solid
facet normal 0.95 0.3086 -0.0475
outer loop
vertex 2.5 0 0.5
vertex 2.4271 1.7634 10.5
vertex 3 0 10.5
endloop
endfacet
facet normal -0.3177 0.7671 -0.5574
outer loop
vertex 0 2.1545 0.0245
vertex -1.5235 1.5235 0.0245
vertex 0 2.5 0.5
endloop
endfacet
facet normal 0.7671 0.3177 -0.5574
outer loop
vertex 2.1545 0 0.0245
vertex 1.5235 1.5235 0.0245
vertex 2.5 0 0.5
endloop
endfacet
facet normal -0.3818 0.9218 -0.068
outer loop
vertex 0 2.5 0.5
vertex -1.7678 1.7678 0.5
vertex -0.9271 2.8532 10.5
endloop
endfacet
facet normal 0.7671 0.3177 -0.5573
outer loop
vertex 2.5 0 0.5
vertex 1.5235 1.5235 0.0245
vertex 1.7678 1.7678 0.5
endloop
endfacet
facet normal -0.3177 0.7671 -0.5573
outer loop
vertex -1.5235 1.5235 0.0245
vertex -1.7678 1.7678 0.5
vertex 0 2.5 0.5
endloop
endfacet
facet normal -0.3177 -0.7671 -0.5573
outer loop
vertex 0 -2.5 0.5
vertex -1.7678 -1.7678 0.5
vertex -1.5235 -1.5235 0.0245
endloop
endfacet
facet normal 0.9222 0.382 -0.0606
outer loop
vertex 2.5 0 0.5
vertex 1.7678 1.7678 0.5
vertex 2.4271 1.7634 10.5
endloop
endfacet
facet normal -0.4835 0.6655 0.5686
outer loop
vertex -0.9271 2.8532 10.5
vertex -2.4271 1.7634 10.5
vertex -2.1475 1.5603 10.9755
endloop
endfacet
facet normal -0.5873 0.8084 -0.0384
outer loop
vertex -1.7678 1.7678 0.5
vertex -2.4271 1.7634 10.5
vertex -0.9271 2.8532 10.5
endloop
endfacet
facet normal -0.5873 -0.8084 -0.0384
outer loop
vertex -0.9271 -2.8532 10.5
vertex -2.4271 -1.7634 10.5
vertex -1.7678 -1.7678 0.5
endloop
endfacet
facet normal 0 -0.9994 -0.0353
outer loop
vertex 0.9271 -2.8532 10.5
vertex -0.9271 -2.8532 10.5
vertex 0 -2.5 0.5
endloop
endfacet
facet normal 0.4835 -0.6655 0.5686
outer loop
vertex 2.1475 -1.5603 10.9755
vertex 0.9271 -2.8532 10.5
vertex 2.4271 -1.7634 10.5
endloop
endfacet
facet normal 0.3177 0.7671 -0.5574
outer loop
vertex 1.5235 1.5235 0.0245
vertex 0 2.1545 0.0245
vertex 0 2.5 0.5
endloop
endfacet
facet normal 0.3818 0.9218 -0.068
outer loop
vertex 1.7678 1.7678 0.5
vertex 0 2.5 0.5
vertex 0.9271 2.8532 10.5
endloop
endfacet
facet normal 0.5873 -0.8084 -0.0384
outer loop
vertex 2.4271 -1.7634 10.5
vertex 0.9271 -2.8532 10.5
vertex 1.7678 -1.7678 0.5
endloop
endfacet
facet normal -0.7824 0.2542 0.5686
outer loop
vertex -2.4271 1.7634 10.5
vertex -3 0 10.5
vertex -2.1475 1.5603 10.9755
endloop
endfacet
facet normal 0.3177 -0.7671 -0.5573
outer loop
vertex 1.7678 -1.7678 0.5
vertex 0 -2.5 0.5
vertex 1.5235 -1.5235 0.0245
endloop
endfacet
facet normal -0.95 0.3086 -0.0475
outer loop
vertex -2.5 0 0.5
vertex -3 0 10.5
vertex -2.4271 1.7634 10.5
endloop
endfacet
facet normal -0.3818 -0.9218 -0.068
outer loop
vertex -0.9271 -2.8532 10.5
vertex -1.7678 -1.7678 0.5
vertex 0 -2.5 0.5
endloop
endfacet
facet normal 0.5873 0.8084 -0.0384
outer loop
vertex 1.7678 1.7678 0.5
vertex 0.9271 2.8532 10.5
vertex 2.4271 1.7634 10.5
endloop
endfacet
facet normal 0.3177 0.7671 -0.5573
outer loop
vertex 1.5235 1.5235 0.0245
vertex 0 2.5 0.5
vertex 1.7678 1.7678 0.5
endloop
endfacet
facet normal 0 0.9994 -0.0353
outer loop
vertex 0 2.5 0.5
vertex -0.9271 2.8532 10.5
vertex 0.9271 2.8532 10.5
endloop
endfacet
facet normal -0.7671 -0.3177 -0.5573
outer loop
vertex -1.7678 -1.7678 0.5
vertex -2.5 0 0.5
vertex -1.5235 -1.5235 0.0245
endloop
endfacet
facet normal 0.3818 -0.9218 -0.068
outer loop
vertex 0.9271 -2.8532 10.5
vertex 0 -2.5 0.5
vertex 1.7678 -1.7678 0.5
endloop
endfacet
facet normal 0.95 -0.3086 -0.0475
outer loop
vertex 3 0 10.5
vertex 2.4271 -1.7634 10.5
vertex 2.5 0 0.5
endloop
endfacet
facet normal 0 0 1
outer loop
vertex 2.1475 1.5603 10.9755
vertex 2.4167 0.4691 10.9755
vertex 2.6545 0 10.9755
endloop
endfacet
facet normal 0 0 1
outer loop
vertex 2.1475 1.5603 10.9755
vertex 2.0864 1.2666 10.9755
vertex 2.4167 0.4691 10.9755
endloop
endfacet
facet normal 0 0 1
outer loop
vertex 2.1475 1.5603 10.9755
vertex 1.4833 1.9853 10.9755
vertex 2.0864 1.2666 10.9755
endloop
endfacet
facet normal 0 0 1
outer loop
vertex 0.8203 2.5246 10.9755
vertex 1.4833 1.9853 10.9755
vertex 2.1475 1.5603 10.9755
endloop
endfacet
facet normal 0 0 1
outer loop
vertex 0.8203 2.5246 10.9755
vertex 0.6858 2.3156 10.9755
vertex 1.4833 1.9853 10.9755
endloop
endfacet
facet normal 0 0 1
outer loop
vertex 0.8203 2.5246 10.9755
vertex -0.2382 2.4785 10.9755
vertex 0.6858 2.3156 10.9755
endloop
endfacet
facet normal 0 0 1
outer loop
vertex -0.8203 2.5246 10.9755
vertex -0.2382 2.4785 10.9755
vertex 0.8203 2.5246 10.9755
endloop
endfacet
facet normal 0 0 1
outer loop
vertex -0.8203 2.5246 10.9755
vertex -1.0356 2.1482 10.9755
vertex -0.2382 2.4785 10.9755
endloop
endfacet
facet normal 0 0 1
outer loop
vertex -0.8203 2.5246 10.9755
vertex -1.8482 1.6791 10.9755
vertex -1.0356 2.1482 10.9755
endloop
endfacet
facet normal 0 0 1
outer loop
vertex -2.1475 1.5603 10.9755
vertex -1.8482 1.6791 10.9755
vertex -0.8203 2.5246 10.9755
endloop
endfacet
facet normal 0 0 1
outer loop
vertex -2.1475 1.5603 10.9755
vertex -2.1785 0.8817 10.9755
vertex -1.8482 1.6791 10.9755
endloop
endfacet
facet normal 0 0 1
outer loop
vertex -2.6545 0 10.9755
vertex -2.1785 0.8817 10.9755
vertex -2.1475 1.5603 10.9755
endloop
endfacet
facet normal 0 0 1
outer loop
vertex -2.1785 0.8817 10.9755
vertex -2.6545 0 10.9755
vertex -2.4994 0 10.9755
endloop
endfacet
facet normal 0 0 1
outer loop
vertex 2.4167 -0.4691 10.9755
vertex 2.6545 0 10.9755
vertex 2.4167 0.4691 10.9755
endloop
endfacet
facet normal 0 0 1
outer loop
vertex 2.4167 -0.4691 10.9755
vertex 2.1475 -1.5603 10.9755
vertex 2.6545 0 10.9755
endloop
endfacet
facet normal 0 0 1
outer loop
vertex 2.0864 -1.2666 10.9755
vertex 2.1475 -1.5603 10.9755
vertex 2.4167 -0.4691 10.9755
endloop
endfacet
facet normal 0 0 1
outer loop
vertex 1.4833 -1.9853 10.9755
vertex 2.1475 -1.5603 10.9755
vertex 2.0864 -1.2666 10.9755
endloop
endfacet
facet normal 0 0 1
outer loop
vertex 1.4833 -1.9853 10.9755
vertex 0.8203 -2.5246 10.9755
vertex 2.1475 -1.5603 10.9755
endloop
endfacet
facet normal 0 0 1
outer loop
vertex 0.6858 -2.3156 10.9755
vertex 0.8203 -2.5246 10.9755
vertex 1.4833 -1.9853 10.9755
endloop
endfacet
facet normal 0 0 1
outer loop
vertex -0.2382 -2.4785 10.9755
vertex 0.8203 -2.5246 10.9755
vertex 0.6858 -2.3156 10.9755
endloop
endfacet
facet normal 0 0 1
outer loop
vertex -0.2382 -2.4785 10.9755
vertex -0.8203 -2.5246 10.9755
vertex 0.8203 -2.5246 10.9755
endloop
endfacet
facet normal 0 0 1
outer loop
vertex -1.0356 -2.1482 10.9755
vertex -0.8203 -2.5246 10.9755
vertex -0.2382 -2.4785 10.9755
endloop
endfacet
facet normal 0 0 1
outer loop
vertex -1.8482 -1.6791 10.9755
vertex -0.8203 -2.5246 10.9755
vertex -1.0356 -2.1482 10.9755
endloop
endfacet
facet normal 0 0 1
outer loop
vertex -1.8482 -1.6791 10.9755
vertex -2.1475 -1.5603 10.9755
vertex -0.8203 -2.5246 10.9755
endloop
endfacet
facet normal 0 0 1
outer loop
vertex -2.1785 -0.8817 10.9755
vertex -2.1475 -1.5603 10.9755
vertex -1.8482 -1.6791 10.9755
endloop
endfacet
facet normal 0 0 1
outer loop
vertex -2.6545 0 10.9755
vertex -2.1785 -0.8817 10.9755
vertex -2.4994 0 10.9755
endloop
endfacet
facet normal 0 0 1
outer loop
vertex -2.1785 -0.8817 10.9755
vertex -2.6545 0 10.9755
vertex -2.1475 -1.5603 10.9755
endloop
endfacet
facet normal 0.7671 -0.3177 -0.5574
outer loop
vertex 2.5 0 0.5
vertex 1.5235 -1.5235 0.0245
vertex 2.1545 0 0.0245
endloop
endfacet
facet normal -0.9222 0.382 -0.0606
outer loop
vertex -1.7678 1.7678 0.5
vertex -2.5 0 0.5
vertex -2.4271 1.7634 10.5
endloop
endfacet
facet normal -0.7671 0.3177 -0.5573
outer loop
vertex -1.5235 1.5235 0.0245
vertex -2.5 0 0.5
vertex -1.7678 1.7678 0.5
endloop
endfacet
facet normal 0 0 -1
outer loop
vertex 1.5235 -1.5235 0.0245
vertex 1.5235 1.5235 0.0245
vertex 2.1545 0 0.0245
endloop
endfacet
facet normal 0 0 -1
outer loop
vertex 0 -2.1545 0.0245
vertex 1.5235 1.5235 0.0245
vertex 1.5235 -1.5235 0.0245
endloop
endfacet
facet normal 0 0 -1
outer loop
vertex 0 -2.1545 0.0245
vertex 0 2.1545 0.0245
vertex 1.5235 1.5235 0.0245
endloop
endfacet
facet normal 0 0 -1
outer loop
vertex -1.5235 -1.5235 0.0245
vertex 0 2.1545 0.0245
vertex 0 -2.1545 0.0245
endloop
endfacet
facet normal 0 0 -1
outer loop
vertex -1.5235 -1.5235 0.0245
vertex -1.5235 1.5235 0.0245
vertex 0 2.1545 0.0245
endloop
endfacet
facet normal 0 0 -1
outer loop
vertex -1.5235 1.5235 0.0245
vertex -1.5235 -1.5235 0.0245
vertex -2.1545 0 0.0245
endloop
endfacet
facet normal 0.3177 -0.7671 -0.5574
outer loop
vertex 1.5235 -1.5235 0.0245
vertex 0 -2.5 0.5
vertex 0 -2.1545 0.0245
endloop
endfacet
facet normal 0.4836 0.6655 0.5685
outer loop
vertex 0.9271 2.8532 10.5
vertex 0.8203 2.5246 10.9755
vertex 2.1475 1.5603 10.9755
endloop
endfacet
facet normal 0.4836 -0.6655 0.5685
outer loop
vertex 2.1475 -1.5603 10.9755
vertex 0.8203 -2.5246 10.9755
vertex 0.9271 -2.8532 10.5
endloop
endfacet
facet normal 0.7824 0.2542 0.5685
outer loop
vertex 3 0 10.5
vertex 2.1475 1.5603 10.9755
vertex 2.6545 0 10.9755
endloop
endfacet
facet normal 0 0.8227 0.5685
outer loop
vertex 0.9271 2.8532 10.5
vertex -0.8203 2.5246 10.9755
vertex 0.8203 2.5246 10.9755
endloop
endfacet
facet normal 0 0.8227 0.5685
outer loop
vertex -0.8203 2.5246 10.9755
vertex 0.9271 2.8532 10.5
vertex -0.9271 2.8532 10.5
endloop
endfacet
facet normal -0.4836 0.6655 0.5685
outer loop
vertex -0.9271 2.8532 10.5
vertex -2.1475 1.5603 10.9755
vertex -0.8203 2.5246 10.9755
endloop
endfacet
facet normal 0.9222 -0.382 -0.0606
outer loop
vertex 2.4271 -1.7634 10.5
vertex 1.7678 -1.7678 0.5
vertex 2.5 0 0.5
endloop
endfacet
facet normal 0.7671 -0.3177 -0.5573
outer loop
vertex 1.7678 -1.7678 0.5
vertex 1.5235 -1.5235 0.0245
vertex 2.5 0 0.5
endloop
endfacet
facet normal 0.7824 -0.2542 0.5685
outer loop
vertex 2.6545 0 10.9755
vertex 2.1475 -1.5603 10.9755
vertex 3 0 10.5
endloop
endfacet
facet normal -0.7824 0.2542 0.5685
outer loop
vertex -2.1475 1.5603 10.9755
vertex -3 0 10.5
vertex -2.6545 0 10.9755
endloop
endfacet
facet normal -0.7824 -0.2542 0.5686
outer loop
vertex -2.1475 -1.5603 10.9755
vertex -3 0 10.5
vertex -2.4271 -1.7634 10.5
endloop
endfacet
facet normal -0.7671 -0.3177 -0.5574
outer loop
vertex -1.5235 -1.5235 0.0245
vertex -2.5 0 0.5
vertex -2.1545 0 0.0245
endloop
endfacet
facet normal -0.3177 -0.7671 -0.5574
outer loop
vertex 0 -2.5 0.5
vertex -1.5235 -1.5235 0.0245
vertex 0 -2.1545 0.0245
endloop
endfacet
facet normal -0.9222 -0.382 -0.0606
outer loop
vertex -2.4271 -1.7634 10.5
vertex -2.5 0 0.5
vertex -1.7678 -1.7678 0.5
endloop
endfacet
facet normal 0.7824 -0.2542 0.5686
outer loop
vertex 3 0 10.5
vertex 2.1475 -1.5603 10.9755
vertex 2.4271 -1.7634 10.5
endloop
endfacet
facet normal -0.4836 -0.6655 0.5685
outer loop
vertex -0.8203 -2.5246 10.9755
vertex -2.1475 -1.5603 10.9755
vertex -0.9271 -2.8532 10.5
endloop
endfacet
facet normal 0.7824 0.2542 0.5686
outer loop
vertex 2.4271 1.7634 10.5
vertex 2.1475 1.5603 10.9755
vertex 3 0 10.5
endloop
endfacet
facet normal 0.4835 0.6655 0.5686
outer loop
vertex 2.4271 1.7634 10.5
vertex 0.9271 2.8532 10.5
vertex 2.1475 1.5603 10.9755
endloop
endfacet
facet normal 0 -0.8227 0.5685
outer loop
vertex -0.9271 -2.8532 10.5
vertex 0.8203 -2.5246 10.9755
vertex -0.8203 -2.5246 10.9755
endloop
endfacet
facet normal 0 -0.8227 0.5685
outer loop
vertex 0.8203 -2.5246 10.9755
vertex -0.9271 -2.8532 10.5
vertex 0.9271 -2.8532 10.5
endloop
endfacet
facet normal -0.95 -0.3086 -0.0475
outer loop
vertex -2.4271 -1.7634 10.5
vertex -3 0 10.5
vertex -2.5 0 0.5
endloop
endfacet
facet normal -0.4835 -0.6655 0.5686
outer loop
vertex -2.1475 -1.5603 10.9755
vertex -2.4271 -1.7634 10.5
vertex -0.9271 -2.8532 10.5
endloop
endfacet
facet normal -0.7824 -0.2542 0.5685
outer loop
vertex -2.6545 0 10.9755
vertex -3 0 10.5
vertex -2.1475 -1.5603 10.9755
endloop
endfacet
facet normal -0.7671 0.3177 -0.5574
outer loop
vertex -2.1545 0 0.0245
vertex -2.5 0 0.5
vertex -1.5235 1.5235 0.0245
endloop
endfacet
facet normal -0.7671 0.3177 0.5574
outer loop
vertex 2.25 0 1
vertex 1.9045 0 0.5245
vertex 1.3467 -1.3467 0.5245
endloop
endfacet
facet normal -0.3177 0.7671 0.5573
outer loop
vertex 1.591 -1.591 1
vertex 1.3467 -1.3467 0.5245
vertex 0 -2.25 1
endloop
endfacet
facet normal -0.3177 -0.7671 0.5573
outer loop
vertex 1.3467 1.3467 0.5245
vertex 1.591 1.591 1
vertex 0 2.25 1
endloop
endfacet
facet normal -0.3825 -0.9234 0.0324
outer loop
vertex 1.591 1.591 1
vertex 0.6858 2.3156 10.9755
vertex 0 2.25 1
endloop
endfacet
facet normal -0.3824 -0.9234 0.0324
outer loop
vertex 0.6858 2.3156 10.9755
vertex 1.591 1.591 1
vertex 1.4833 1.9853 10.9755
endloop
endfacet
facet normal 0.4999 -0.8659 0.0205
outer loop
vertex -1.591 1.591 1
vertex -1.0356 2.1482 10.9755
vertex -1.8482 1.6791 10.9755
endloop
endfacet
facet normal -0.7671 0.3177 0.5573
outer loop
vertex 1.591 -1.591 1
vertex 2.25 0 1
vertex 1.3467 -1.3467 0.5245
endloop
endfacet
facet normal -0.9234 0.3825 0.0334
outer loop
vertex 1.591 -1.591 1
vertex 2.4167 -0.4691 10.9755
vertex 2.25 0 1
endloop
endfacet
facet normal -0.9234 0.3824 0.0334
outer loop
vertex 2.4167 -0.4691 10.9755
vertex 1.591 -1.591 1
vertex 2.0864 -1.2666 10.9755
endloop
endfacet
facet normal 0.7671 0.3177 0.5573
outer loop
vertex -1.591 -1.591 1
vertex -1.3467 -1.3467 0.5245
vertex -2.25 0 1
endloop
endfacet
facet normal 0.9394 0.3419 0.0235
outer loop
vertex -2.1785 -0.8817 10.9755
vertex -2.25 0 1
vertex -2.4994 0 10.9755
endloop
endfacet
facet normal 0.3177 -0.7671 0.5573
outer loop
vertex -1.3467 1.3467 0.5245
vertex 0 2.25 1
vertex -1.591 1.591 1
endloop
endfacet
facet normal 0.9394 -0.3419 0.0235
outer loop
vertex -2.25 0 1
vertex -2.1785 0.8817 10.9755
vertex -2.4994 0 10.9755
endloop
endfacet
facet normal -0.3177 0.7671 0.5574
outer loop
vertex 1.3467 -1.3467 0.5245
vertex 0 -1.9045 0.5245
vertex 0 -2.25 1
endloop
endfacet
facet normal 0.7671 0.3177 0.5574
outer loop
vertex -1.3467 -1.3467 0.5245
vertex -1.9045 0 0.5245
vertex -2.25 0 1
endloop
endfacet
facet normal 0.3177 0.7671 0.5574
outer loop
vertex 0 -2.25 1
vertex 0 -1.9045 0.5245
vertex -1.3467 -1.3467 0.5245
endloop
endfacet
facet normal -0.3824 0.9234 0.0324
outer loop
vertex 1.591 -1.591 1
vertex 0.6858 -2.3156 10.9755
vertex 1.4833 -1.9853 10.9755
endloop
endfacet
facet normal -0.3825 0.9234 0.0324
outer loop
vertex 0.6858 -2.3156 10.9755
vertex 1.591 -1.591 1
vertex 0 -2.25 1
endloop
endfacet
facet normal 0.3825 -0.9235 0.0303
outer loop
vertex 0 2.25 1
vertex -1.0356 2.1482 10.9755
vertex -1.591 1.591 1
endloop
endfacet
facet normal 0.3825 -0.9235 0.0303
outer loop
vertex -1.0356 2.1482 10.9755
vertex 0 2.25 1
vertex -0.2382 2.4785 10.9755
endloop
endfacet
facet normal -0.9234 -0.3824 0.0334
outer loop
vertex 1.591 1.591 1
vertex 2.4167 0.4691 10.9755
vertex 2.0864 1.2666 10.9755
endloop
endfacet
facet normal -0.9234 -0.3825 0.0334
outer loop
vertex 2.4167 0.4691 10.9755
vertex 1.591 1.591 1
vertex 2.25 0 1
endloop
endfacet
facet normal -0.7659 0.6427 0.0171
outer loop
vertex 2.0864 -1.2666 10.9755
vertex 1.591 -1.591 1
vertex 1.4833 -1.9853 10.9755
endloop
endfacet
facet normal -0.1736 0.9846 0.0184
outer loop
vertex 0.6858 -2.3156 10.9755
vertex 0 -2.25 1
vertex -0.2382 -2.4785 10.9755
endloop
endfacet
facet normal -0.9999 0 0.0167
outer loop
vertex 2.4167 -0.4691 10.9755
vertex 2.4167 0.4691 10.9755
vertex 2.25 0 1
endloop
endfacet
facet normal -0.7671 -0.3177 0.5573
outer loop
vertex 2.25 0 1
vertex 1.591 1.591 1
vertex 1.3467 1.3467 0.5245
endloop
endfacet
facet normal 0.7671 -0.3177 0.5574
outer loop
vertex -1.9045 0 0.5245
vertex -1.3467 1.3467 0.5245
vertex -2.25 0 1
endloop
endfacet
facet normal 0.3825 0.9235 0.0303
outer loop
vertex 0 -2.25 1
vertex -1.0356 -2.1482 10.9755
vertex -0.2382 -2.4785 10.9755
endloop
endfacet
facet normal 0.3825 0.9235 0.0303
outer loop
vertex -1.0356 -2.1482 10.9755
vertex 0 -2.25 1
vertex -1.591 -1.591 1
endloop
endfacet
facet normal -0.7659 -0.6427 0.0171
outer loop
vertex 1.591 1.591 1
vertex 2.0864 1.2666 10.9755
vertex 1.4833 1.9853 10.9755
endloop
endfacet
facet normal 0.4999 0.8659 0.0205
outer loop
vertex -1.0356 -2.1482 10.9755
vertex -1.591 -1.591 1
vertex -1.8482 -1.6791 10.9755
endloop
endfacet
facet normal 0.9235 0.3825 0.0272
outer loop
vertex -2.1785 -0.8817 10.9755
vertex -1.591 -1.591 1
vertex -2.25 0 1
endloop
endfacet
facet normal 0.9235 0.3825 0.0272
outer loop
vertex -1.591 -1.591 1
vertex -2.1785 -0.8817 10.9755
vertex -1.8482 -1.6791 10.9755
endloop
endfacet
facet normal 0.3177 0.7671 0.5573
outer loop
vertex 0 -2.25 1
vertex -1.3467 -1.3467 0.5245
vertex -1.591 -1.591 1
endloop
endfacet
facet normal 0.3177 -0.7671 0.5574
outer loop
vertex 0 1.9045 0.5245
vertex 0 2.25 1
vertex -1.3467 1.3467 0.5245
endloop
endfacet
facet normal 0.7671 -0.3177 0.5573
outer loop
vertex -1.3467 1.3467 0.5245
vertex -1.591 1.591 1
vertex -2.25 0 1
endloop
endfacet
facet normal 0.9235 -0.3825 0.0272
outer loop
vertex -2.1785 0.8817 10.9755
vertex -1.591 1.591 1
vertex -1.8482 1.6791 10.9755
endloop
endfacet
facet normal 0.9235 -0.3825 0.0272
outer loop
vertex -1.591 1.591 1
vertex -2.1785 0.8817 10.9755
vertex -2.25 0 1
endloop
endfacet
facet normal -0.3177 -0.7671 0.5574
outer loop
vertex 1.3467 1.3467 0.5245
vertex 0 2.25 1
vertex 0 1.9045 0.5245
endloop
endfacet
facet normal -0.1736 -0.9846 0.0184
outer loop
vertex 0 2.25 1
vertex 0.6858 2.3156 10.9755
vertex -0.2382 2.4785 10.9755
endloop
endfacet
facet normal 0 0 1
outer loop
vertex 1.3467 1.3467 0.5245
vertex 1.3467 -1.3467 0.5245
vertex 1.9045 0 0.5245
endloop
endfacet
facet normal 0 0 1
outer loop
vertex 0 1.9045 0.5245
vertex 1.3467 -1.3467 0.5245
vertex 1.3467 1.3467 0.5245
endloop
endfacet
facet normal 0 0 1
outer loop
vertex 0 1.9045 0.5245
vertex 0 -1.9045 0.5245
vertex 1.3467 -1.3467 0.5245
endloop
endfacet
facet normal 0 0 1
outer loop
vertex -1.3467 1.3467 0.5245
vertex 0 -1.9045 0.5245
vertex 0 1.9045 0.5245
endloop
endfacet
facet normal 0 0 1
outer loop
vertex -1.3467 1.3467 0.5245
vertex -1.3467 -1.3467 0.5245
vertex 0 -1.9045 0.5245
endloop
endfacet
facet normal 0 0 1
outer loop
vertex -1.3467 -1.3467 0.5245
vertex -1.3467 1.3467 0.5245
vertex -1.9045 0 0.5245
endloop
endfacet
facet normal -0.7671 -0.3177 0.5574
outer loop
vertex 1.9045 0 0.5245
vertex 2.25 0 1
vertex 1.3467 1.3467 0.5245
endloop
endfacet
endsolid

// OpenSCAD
// file: donut.scad
module donut(radius, thick) {
    rotate_extrude()
        translate([radius,0,0])
        circle(thick);
}

translate([0, 0, -200]) donut(100, 100);
donut(80, 50);
translate([0, 0, 120]) donut(50, 10);
// main file
use<donut.scad>

radius = 0.5;

module unk(base_dia, top_dia, height) {
    hull() {
        translate([0, 0, radius]) donut(base_dia/2, radius);
        translate([0, 0, radius + height]) donut(top_dia/2, radius);
    }
}

module cup(base_dia, top_dia, height) {
    difference() {
        unk(base_dia, top_dia, height);
        translate([0, 0, radius])
          unk(base_dia-radius, top_dia-radius, height*2);
    }
}

cup(4, 5, 10);
